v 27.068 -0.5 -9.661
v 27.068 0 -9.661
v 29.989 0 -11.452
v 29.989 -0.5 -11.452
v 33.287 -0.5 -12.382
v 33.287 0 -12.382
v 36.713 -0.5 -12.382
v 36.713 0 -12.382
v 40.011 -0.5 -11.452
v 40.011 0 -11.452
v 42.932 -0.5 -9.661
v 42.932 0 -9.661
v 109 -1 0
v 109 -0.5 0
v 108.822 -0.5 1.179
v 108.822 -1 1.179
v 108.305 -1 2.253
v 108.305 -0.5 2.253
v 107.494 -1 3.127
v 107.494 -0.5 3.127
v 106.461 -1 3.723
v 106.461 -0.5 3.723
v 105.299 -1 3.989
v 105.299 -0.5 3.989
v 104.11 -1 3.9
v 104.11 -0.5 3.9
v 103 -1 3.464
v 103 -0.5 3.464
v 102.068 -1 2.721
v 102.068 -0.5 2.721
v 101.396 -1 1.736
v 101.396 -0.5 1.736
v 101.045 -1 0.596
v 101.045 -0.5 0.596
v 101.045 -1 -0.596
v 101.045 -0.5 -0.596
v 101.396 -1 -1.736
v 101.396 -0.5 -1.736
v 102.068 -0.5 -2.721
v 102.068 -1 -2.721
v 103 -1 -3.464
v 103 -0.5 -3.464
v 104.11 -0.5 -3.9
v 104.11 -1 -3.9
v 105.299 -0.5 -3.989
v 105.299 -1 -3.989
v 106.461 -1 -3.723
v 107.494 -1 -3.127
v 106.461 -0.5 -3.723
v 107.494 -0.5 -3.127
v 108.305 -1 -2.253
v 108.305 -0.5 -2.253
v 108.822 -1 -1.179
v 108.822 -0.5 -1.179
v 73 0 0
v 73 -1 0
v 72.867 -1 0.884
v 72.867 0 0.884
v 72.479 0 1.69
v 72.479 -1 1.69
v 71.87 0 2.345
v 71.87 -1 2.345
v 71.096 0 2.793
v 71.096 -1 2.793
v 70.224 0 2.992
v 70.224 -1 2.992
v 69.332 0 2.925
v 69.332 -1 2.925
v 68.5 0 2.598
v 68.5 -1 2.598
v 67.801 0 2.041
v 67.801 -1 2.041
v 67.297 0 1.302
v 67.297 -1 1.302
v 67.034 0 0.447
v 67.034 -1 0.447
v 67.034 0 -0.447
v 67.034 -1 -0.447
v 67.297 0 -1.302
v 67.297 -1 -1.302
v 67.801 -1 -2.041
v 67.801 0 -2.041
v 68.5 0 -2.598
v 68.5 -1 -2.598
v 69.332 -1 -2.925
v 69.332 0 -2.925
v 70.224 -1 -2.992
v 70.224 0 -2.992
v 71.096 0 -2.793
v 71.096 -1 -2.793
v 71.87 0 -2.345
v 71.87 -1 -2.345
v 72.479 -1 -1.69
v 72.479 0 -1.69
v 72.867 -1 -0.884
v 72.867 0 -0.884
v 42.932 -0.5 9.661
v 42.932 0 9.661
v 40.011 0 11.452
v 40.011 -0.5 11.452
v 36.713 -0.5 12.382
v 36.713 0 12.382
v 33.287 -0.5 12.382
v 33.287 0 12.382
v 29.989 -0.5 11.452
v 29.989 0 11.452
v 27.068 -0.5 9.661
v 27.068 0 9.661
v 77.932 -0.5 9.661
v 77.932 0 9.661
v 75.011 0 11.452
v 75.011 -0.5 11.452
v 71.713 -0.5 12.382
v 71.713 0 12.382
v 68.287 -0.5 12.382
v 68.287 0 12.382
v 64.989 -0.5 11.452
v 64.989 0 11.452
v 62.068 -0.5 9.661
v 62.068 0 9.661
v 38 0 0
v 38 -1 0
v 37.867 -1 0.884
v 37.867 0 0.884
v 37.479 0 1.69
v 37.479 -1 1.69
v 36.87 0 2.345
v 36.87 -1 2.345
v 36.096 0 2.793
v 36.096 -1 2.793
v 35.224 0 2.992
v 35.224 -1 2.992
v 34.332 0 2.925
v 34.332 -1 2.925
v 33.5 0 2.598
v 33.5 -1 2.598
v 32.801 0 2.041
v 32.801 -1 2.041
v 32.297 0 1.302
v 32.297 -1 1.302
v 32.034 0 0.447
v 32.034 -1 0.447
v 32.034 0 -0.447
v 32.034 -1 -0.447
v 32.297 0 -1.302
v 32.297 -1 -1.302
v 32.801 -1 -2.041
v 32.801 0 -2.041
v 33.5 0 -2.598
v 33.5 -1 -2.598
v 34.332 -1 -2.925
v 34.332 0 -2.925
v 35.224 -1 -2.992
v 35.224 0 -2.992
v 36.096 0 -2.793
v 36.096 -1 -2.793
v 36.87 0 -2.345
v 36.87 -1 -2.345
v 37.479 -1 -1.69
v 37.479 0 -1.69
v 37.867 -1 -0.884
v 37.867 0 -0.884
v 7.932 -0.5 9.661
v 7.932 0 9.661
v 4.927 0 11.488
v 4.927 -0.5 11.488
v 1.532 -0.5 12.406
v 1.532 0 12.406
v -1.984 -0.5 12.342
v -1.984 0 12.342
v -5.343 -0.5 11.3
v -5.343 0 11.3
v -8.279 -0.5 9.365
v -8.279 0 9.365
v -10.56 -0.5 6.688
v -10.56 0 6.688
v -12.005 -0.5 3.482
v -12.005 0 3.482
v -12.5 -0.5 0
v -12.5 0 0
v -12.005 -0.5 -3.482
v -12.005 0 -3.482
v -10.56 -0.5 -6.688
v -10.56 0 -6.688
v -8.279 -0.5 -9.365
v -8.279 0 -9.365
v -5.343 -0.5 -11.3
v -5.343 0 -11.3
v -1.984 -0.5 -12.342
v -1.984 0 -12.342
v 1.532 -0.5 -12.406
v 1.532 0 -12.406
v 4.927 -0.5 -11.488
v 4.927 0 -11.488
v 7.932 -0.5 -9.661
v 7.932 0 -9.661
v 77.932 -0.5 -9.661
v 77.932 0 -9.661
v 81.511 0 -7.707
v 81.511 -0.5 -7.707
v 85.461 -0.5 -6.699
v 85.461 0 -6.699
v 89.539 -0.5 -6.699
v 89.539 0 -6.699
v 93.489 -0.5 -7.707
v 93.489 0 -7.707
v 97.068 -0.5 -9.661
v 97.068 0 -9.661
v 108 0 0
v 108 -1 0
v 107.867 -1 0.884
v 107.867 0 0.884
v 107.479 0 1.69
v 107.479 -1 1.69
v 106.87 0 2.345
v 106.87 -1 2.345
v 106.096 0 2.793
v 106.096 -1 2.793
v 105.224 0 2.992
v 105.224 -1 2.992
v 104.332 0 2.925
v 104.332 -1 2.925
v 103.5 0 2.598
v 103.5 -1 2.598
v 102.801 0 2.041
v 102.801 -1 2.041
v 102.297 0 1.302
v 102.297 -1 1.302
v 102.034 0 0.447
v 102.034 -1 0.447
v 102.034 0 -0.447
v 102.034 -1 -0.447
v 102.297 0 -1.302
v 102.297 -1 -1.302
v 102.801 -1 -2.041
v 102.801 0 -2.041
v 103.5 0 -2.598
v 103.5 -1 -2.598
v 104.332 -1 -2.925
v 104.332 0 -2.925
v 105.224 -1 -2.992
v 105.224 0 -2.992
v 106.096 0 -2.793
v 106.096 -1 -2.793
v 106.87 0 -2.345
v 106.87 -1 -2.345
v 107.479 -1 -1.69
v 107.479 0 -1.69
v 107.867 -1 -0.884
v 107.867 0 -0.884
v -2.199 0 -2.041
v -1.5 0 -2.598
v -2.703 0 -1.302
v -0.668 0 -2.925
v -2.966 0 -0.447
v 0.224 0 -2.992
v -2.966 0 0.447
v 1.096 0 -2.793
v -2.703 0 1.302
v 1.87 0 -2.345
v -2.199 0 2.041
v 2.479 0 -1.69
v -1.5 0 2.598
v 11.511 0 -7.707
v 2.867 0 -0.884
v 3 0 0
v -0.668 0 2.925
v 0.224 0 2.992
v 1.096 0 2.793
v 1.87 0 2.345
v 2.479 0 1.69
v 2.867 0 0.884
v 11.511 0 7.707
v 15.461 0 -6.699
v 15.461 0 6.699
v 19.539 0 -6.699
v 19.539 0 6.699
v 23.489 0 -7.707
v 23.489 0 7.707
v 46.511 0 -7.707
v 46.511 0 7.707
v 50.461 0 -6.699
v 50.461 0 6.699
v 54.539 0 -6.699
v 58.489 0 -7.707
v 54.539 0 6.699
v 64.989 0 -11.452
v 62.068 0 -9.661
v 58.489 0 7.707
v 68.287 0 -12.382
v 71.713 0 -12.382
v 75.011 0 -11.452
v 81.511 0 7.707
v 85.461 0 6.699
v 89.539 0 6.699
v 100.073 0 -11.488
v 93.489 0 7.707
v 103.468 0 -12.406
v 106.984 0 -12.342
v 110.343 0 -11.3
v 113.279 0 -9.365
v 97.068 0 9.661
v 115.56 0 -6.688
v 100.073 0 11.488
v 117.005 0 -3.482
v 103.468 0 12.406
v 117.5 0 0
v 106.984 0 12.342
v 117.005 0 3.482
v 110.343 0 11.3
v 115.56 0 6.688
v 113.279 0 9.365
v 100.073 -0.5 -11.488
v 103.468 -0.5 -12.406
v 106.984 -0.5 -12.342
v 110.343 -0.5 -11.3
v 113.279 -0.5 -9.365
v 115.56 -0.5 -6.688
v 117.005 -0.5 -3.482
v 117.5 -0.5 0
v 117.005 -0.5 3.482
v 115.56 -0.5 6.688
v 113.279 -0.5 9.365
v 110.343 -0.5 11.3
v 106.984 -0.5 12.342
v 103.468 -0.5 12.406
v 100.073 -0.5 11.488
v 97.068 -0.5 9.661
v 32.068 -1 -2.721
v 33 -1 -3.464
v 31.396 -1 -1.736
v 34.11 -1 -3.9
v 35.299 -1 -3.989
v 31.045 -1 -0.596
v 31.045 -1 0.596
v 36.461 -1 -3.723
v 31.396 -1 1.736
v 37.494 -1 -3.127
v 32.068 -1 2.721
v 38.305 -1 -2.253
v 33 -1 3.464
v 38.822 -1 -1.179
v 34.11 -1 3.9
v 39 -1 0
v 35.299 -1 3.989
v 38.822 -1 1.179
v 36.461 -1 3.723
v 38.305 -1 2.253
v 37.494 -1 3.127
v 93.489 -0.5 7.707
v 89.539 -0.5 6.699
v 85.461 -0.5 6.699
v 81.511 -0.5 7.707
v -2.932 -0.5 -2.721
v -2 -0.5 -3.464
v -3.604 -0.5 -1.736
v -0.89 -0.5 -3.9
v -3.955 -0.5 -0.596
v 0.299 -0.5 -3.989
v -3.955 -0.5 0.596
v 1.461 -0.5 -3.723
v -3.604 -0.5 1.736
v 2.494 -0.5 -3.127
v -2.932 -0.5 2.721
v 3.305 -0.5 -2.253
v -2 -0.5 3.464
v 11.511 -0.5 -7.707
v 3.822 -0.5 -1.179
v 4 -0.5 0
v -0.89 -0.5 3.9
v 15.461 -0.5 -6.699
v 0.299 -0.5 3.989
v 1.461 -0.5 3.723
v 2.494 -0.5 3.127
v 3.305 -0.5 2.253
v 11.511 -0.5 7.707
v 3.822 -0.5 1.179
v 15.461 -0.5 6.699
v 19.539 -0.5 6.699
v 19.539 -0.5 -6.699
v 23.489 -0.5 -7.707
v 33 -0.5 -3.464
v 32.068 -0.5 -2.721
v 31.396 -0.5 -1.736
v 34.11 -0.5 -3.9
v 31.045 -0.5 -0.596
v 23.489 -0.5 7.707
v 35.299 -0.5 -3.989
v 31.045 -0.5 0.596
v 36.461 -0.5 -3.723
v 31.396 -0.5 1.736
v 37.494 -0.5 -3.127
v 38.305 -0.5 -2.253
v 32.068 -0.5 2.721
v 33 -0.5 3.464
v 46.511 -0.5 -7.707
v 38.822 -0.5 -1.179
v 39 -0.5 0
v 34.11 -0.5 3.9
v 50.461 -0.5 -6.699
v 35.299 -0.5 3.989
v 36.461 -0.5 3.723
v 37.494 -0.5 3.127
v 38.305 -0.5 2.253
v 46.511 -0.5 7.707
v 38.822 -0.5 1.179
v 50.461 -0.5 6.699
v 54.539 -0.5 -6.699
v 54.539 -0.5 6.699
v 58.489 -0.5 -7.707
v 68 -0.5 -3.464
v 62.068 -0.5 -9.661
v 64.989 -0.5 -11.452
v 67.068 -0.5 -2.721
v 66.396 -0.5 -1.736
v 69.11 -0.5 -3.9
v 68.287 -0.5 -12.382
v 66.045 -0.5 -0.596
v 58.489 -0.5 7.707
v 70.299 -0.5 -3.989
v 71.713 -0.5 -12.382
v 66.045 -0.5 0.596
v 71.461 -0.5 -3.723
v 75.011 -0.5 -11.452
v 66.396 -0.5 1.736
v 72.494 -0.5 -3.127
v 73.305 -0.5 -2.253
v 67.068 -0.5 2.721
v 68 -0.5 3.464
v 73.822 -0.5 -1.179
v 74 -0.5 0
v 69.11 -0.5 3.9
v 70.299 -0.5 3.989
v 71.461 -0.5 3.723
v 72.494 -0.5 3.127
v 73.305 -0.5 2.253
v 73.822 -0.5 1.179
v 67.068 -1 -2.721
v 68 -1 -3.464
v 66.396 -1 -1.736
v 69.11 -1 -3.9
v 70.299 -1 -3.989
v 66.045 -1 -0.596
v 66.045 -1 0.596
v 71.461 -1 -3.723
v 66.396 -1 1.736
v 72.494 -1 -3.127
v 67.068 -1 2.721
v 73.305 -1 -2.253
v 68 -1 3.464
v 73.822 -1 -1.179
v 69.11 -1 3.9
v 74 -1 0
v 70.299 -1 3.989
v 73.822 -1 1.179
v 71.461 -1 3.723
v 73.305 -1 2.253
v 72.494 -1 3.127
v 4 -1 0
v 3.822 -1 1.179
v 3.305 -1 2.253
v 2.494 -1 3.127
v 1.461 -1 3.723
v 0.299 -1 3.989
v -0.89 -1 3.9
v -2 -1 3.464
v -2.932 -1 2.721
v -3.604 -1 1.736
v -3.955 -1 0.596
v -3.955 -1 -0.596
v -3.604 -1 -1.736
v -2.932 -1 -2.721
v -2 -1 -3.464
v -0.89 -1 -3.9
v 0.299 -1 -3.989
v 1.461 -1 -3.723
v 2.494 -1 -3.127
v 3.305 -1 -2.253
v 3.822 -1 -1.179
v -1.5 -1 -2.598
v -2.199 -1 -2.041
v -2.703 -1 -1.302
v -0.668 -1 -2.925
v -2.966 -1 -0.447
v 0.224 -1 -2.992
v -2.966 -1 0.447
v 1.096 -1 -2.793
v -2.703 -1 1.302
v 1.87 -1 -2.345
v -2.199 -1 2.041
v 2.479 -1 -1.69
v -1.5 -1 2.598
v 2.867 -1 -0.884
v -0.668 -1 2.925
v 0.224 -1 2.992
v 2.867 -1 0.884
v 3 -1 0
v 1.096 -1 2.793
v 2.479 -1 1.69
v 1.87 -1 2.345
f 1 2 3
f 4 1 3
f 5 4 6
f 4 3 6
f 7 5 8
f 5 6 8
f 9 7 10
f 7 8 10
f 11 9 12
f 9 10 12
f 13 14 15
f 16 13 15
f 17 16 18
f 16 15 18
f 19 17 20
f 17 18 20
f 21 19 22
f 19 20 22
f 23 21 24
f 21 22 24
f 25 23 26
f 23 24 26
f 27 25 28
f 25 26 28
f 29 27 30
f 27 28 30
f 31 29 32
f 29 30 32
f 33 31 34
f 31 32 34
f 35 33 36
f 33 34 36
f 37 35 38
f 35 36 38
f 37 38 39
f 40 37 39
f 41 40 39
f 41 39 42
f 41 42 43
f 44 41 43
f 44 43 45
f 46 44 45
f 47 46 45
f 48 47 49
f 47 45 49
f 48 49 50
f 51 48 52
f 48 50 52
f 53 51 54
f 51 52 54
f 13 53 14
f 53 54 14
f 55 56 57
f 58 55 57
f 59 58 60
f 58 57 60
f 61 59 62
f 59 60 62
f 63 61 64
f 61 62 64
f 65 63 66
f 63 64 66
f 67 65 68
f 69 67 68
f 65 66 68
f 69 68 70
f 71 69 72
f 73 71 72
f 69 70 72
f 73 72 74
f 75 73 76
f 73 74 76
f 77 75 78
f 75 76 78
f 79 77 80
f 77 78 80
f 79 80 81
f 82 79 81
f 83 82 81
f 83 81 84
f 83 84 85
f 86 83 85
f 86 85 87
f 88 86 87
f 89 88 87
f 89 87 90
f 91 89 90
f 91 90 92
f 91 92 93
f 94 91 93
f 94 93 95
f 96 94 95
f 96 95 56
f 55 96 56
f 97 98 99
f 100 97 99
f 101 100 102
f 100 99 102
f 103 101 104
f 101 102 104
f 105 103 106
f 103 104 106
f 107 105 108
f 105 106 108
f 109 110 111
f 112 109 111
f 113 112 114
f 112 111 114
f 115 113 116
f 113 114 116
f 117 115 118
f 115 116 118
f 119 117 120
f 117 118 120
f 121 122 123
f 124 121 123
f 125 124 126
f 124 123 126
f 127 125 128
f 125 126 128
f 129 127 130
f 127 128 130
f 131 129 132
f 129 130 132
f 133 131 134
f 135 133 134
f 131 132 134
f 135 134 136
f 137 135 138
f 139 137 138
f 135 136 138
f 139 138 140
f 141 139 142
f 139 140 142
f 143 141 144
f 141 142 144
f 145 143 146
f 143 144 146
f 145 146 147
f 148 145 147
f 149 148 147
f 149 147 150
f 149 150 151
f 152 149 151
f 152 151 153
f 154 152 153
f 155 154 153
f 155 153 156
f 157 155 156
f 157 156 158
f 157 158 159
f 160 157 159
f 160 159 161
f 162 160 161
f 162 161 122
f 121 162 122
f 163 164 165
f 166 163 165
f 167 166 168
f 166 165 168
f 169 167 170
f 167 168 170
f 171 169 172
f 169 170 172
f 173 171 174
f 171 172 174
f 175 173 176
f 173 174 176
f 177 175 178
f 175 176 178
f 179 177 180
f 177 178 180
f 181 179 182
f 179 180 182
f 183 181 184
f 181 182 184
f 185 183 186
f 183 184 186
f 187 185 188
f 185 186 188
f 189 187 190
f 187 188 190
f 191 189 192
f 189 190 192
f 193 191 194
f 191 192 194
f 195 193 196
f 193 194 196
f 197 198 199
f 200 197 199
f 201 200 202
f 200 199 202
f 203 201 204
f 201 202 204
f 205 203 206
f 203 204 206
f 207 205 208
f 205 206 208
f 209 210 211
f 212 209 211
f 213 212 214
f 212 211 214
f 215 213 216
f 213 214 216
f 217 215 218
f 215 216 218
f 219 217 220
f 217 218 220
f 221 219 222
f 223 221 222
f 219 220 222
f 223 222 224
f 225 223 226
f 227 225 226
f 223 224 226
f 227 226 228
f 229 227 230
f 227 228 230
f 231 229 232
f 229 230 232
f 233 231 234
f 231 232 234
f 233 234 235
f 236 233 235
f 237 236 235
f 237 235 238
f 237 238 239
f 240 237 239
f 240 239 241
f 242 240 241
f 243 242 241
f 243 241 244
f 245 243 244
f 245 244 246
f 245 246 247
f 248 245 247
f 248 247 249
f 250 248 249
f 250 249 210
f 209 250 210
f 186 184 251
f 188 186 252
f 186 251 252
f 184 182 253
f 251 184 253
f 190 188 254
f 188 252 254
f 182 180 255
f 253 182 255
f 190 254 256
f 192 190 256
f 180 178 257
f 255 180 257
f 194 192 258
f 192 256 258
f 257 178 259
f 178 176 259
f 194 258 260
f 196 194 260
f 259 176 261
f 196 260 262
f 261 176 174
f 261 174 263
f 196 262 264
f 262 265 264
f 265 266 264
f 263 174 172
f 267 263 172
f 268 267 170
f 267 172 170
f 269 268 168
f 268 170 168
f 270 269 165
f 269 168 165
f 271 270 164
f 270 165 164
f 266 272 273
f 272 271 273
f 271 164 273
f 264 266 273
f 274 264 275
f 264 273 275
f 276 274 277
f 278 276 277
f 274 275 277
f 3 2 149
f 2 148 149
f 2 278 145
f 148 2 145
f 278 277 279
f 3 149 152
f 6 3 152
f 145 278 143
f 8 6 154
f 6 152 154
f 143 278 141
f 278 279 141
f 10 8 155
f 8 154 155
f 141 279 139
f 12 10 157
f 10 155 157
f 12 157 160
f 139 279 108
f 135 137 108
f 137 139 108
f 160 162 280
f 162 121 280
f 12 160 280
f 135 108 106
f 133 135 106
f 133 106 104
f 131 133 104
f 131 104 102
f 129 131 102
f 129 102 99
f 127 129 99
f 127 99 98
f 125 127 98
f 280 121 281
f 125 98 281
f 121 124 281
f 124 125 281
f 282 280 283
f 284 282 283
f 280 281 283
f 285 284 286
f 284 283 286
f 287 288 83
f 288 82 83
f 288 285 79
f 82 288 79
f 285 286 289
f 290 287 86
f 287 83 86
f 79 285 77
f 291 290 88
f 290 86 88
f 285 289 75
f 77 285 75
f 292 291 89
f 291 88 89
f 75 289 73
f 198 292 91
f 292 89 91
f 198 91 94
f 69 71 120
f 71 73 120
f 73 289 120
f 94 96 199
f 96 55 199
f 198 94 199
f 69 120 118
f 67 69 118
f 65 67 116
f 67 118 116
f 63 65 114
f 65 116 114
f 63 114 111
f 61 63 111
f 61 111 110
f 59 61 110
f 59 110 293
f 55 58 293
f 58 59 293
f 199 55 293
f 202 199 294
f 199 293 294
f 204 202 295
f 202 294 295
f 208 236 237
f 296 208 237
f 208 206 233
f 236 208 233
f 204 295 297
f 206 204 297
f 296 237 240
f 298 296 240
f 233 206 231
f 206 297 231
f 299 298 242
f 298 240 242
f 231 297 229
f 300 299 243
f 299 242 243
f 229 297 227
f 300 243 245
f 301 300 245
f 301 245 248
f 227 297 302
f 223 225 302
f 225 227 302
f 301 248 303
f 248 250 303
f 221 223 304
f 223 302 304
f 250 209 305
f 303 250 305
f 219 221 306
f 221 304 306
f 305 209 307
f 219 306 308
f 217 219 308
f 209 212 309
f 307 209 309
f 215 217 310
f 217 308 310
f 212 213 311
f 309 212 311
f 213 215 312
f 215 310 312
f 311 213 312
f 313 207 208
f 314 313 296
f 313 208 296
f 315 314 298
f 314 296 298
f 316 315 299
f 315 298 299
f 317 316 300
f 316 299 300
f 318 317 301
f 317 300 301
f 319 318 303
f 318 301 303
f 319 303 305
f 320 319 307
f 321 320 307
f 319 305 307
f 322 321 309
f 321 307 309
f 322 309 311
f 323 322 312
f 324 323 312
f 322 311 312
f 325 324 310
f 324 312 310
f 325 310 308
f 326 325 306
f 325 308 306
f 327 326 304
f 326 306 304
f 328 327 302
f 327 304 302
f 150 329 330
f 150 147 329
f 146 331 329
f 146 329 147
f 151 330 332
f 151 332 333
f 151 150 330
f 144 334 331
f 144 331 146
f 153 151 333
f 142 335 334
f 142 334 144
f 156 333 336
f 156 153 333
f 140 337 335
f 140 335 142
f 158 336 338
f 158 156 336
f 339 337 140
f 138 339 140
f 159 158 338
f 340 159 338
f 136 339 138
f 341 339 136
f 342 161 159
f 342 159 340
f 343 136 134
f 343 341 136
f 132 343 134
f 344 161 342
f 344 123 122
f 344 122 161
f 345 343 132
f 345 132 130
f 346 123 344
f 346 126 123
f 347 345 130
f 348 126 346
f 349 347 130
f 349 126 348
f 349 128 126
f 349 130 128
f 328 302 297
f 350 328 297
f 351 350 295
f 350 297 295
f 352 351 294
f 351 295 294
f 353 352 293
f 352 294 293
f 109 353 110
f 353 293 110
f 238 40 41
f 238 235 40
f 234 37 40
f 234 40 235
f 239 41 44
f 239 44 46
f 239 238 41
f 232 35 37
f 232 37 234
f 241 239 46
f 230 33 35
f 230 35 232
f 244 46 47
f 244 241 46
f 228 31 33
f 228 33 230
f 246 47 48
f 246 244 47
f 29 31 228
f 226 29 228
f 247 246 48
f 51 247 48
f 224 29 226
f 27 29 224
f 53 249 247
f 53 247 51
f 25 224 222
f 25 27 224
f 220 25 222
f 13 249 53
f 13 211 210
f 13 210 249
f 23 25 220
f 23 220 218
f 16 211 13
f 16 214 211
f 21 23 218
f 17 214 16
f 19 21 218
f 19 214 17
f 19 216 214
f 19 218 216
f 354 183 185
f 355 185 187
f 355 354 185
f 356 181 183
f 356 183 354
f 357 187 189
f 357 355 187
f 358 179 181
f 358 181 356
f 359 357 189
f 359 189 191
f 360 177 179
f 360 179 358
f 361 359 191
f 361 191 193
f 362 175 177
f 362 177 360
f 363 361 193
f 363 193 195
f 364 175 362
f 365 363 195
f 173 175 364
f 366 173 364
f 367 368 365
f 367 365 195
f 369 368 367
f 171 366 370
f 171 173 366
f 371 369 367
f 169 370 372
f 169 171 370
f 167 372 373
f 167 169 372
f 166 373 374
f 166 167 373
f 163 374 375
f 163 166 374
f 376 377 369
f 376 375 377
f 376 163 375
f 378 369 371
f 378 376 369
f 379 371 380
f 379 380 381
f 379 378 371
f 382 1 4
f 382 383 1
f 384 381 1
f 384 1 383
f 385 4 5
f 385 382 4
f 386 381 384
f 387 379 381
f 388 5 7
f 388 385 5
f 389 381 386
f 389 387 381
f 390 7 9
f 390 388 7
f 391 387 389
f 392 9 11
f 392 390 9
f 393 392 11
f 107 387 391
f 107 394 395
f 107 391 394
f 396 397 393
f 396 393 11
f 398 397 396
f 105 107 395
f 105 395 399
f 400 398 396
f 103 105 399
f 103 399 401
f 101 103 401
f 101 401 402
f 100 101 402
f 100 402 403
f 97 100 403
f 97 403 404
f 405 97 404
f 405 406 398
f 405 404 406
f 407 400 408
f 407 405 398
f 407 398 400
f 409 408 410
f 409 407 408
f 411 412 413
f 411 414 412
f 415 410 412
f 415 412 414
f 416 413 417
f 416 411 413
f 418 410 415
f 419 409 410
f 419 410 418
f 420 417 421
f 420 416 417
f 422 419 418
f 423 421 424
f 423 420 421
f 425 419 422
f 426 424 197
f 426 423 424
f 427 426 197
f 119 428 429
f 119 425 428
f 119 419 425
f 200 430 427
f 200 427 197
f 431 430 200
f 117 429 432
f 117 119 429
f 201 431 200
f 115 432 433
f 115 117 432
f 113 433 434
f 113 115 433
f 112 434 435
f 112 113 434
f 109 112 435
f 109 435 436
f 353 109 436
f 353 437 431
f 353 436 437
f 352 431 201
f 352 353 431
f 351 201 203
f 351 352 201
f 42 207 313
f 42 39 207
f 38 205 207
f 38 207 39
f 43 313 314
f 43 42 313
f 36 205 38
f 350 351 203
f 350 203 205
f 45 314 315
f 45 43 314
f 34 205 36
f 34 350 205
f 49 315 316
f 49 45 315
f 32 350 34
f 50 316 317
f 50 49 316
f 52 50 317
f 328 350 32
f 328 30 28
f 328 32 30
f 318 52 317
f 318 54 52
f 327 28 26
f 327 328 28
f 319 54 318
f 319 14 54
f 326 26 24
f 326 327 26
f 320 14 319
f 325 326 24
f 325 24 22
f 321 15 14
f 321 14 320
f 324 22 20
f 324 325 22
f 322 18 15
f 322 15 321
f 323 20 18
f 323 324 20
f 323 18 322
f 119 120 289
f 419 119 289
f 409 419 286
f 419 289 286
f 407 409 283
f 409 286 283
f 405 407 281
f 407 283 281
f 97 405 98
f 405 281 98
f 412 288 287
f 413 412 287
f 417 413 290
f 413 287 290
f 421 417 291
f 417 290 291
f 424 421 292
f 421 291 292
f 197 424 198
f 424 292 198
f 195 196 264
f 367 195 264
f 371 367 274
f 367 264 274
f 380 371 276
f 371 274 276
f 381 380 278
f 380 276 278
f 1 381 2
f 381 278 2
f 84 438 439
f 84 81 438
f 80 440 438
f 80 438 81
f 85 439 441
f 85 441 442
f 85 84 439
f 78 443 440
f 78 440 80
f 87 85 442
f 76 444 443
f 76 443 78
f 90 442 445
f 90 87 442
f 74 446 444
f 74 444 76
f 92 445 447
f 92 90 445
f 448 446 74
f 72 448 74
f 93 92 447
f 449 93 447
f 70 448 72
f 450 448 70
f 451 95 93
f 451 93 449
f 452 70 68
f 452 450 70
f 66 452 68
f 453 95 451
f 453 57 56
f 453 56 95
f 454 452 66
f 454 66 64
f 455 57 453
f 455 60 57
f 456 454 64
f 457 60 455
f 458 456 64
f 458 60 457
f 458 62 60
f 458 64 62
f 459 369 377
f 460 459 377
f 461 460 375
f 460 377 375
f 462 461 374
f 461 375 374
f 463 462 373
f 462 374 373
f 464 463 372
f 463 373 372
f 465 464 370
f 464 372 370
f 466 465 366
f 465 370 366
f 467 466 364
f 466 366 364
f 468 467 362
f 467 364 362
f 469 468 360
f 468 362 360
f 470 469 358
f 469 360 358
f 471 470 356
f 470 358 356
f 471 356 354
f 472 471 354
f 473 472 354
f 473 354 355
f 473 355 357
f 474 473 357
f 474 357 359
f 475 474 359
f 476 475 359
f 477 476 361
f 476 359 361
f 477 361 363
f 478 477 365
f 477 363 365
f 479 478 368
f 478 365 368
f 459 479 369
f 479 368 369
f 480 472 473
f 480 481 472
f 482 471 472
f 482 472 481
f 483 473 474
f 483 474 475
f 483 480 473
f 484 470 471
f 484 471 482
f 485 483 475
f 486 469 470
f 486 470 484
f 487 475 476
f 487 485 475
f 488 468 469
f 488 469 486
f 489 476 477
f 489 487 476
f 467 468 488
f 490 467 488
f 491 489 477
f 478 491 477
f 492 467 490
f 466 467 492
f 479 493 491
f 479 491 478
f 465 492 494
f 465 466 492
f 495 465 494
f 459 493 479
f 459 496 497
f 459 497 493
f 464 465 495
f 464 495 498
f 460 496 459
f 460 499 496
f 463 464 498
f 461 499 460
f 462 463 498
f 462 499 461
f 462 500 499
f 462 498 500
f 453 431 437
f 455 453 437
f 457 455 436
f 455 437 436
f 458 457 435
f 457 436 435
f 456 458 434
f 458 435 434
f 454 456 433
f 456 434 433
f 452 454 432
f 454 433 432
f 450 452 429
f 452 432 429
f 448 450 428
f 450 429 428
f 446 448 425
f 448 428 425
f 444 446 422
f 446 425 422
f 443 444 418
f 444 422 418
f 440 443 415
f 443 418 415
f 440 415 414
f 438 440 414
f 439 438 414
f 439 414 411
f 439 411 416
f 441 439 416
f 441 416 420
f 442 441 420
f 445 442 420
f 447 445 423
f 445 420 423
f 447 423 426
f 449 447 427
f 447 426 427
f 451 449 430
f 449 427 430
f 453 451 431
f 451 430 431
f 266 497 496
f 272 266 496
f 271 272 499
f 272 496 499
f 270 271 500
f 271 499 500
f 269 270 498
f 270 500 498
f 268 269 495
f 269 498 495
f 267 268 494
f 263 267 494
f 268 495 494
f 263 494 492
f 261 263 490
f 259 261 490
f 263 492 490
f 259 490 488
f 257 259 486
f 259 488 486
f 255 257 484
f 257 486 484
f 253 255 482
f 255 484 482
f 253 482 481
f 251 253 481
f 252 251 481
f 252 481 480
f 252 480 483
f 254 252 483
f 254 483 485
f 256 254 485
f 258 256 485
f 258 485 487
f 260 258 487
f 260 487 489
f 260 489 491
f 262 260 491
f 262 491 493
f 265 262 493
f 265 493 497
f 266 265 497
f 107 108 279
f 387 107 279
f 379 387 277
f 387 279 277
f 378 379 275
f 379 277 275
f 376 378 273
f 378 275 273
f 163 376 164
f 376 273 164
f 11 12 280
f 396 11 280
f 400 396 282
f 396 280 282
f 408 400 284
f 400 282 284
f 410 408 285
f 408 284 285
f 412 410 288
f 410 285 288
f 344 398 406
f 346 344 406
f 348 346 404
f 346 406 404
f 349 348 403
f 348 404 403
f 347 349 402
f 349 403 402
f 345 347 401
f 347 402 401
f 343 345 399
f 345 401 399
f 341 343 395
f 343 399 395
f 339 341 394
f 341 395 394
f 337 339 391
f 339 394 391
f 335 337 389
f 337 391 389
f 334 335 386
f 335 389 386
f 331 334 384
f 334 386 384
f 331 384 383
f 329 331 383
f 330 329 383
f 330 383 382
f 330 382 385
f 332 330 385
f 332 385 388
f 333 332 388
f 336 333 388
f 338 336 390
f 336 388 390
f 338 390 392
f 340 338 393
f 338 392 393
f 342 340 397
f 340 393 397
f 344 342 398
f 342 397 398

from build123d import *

# Parameters (mm, degrees)
F1_R      = 12.5
F4_DEPTH  = 0.5
F5_R      = 4
F6_DEPTH  = 0.5
F3_R      = 3
F2_R      = 2.7
F7_R      = 3
F9_DEPTH  = 25
F14_DEPTH = 0.5


with BuildPart() as f4:
    # F1 (on Front) → F4 (new body)
    with BuildSketch(Plane.XZ):
        Circle(F1_R)
    extrude(amount=F4_DEPTH)

    # F5 (on face) → F6 (join)
    with BuildSketch(Plane.XZ.offset(0.5)):
        Circle(F5_R)
    extrude(amount=F6_DEPTH)

    # F3 (on Front) → F8 section 0
    with BuildSketch(Plane.XZ):
        Circle(F3_R)
    # F2 (on offset) → F8 section 1
    with BuildSketch(Plane.XZ.offset(1.5)):
        Circle(F2_R)
    loft(mode=Mode.SUBTRACT)

    # F7 (on face) → F9 (cut)
    with BuildSketch(Plane.XZ.offset(1)):
        Circle(F7_R)
    extrude(amount=-F9_DEPTH, mode=Mode.SUBTRACT)


with BuildPart() as f10_1:
    # F10: copy of F4
    add(f4.part.moved(Location((35, 0, 0))))


with BuildPart() as f11_1:
    # F11: copy of F4
    add(f4.part.moved(Location((105, 0, 0))))


with BuildPart() as f12_1:
    # F12: copy of F4
    add(f4.part.moved(Location((70, 0, 0))))


with BuildPart() as f4_1:
    add(f4.part)

    add(f10_1.part)  # F14 merges F10_1

    add(f11_1.part)  # F14 merges F11_1

    add(f12_1.part)  # F14 merges F12_1
    # F13 (on Front) → F14 (join)
    with BuildSketch(Plane.XZ):
        with BuildLine():
            ThreePointArc((27.0678855609, 9.6608260788), (17.5, 6.5713974561), (7.9321144391, 9.6608260788))
            Line((7.9321144391, 9.6608260788), (7.9321144391, -9.6608260788))
            ThreePointArc((7.9321144391, -9.6608260788), (17.5, -6.5713974561), (27.0678855609, -9.6608260788))
            Line((27.0678855609, -9.6608260788), (27.0678855609, 9.6608260788))
        make_face()
        with BuildLine():
            ThreePointArc((62.0678855609, 9.6608260788), (52.5, 6.5713974561), (42.9321144391, 9.6608260788))
            Line((42.9321144391, 9.6608260788), (42.9321144391, -9.6608260788))
            ThreePointArc((42.9321144391, -9.6608260788), (52.5, -6.5713974561), (62.0678855609, -9.6608260788))
            Line((62.0678855609, -9.6608260788), (62.0678855609, 9.6608260788))
        make_face()
        with BuildLine():
            ThreePointArc((97.0678855609, 9.6608260788), (87.5, 6.5713974561), (77.9321144391, 9.6608260788))
            Line((77.9321144391, 9.6608260788), (77.9321144391, -9.6608260788))
            ThreePointArc((77.9321144391, -9.6608260788), (87.5, -6.5713974561), (97.0678855609, -9.6608260788))
            Line((97.0678855609, -9.6608260788), (97.0678855609, 9.6608260788))
        make_face()
    extrude(amount=F14_DEPTH)


solid = f4_1.part
